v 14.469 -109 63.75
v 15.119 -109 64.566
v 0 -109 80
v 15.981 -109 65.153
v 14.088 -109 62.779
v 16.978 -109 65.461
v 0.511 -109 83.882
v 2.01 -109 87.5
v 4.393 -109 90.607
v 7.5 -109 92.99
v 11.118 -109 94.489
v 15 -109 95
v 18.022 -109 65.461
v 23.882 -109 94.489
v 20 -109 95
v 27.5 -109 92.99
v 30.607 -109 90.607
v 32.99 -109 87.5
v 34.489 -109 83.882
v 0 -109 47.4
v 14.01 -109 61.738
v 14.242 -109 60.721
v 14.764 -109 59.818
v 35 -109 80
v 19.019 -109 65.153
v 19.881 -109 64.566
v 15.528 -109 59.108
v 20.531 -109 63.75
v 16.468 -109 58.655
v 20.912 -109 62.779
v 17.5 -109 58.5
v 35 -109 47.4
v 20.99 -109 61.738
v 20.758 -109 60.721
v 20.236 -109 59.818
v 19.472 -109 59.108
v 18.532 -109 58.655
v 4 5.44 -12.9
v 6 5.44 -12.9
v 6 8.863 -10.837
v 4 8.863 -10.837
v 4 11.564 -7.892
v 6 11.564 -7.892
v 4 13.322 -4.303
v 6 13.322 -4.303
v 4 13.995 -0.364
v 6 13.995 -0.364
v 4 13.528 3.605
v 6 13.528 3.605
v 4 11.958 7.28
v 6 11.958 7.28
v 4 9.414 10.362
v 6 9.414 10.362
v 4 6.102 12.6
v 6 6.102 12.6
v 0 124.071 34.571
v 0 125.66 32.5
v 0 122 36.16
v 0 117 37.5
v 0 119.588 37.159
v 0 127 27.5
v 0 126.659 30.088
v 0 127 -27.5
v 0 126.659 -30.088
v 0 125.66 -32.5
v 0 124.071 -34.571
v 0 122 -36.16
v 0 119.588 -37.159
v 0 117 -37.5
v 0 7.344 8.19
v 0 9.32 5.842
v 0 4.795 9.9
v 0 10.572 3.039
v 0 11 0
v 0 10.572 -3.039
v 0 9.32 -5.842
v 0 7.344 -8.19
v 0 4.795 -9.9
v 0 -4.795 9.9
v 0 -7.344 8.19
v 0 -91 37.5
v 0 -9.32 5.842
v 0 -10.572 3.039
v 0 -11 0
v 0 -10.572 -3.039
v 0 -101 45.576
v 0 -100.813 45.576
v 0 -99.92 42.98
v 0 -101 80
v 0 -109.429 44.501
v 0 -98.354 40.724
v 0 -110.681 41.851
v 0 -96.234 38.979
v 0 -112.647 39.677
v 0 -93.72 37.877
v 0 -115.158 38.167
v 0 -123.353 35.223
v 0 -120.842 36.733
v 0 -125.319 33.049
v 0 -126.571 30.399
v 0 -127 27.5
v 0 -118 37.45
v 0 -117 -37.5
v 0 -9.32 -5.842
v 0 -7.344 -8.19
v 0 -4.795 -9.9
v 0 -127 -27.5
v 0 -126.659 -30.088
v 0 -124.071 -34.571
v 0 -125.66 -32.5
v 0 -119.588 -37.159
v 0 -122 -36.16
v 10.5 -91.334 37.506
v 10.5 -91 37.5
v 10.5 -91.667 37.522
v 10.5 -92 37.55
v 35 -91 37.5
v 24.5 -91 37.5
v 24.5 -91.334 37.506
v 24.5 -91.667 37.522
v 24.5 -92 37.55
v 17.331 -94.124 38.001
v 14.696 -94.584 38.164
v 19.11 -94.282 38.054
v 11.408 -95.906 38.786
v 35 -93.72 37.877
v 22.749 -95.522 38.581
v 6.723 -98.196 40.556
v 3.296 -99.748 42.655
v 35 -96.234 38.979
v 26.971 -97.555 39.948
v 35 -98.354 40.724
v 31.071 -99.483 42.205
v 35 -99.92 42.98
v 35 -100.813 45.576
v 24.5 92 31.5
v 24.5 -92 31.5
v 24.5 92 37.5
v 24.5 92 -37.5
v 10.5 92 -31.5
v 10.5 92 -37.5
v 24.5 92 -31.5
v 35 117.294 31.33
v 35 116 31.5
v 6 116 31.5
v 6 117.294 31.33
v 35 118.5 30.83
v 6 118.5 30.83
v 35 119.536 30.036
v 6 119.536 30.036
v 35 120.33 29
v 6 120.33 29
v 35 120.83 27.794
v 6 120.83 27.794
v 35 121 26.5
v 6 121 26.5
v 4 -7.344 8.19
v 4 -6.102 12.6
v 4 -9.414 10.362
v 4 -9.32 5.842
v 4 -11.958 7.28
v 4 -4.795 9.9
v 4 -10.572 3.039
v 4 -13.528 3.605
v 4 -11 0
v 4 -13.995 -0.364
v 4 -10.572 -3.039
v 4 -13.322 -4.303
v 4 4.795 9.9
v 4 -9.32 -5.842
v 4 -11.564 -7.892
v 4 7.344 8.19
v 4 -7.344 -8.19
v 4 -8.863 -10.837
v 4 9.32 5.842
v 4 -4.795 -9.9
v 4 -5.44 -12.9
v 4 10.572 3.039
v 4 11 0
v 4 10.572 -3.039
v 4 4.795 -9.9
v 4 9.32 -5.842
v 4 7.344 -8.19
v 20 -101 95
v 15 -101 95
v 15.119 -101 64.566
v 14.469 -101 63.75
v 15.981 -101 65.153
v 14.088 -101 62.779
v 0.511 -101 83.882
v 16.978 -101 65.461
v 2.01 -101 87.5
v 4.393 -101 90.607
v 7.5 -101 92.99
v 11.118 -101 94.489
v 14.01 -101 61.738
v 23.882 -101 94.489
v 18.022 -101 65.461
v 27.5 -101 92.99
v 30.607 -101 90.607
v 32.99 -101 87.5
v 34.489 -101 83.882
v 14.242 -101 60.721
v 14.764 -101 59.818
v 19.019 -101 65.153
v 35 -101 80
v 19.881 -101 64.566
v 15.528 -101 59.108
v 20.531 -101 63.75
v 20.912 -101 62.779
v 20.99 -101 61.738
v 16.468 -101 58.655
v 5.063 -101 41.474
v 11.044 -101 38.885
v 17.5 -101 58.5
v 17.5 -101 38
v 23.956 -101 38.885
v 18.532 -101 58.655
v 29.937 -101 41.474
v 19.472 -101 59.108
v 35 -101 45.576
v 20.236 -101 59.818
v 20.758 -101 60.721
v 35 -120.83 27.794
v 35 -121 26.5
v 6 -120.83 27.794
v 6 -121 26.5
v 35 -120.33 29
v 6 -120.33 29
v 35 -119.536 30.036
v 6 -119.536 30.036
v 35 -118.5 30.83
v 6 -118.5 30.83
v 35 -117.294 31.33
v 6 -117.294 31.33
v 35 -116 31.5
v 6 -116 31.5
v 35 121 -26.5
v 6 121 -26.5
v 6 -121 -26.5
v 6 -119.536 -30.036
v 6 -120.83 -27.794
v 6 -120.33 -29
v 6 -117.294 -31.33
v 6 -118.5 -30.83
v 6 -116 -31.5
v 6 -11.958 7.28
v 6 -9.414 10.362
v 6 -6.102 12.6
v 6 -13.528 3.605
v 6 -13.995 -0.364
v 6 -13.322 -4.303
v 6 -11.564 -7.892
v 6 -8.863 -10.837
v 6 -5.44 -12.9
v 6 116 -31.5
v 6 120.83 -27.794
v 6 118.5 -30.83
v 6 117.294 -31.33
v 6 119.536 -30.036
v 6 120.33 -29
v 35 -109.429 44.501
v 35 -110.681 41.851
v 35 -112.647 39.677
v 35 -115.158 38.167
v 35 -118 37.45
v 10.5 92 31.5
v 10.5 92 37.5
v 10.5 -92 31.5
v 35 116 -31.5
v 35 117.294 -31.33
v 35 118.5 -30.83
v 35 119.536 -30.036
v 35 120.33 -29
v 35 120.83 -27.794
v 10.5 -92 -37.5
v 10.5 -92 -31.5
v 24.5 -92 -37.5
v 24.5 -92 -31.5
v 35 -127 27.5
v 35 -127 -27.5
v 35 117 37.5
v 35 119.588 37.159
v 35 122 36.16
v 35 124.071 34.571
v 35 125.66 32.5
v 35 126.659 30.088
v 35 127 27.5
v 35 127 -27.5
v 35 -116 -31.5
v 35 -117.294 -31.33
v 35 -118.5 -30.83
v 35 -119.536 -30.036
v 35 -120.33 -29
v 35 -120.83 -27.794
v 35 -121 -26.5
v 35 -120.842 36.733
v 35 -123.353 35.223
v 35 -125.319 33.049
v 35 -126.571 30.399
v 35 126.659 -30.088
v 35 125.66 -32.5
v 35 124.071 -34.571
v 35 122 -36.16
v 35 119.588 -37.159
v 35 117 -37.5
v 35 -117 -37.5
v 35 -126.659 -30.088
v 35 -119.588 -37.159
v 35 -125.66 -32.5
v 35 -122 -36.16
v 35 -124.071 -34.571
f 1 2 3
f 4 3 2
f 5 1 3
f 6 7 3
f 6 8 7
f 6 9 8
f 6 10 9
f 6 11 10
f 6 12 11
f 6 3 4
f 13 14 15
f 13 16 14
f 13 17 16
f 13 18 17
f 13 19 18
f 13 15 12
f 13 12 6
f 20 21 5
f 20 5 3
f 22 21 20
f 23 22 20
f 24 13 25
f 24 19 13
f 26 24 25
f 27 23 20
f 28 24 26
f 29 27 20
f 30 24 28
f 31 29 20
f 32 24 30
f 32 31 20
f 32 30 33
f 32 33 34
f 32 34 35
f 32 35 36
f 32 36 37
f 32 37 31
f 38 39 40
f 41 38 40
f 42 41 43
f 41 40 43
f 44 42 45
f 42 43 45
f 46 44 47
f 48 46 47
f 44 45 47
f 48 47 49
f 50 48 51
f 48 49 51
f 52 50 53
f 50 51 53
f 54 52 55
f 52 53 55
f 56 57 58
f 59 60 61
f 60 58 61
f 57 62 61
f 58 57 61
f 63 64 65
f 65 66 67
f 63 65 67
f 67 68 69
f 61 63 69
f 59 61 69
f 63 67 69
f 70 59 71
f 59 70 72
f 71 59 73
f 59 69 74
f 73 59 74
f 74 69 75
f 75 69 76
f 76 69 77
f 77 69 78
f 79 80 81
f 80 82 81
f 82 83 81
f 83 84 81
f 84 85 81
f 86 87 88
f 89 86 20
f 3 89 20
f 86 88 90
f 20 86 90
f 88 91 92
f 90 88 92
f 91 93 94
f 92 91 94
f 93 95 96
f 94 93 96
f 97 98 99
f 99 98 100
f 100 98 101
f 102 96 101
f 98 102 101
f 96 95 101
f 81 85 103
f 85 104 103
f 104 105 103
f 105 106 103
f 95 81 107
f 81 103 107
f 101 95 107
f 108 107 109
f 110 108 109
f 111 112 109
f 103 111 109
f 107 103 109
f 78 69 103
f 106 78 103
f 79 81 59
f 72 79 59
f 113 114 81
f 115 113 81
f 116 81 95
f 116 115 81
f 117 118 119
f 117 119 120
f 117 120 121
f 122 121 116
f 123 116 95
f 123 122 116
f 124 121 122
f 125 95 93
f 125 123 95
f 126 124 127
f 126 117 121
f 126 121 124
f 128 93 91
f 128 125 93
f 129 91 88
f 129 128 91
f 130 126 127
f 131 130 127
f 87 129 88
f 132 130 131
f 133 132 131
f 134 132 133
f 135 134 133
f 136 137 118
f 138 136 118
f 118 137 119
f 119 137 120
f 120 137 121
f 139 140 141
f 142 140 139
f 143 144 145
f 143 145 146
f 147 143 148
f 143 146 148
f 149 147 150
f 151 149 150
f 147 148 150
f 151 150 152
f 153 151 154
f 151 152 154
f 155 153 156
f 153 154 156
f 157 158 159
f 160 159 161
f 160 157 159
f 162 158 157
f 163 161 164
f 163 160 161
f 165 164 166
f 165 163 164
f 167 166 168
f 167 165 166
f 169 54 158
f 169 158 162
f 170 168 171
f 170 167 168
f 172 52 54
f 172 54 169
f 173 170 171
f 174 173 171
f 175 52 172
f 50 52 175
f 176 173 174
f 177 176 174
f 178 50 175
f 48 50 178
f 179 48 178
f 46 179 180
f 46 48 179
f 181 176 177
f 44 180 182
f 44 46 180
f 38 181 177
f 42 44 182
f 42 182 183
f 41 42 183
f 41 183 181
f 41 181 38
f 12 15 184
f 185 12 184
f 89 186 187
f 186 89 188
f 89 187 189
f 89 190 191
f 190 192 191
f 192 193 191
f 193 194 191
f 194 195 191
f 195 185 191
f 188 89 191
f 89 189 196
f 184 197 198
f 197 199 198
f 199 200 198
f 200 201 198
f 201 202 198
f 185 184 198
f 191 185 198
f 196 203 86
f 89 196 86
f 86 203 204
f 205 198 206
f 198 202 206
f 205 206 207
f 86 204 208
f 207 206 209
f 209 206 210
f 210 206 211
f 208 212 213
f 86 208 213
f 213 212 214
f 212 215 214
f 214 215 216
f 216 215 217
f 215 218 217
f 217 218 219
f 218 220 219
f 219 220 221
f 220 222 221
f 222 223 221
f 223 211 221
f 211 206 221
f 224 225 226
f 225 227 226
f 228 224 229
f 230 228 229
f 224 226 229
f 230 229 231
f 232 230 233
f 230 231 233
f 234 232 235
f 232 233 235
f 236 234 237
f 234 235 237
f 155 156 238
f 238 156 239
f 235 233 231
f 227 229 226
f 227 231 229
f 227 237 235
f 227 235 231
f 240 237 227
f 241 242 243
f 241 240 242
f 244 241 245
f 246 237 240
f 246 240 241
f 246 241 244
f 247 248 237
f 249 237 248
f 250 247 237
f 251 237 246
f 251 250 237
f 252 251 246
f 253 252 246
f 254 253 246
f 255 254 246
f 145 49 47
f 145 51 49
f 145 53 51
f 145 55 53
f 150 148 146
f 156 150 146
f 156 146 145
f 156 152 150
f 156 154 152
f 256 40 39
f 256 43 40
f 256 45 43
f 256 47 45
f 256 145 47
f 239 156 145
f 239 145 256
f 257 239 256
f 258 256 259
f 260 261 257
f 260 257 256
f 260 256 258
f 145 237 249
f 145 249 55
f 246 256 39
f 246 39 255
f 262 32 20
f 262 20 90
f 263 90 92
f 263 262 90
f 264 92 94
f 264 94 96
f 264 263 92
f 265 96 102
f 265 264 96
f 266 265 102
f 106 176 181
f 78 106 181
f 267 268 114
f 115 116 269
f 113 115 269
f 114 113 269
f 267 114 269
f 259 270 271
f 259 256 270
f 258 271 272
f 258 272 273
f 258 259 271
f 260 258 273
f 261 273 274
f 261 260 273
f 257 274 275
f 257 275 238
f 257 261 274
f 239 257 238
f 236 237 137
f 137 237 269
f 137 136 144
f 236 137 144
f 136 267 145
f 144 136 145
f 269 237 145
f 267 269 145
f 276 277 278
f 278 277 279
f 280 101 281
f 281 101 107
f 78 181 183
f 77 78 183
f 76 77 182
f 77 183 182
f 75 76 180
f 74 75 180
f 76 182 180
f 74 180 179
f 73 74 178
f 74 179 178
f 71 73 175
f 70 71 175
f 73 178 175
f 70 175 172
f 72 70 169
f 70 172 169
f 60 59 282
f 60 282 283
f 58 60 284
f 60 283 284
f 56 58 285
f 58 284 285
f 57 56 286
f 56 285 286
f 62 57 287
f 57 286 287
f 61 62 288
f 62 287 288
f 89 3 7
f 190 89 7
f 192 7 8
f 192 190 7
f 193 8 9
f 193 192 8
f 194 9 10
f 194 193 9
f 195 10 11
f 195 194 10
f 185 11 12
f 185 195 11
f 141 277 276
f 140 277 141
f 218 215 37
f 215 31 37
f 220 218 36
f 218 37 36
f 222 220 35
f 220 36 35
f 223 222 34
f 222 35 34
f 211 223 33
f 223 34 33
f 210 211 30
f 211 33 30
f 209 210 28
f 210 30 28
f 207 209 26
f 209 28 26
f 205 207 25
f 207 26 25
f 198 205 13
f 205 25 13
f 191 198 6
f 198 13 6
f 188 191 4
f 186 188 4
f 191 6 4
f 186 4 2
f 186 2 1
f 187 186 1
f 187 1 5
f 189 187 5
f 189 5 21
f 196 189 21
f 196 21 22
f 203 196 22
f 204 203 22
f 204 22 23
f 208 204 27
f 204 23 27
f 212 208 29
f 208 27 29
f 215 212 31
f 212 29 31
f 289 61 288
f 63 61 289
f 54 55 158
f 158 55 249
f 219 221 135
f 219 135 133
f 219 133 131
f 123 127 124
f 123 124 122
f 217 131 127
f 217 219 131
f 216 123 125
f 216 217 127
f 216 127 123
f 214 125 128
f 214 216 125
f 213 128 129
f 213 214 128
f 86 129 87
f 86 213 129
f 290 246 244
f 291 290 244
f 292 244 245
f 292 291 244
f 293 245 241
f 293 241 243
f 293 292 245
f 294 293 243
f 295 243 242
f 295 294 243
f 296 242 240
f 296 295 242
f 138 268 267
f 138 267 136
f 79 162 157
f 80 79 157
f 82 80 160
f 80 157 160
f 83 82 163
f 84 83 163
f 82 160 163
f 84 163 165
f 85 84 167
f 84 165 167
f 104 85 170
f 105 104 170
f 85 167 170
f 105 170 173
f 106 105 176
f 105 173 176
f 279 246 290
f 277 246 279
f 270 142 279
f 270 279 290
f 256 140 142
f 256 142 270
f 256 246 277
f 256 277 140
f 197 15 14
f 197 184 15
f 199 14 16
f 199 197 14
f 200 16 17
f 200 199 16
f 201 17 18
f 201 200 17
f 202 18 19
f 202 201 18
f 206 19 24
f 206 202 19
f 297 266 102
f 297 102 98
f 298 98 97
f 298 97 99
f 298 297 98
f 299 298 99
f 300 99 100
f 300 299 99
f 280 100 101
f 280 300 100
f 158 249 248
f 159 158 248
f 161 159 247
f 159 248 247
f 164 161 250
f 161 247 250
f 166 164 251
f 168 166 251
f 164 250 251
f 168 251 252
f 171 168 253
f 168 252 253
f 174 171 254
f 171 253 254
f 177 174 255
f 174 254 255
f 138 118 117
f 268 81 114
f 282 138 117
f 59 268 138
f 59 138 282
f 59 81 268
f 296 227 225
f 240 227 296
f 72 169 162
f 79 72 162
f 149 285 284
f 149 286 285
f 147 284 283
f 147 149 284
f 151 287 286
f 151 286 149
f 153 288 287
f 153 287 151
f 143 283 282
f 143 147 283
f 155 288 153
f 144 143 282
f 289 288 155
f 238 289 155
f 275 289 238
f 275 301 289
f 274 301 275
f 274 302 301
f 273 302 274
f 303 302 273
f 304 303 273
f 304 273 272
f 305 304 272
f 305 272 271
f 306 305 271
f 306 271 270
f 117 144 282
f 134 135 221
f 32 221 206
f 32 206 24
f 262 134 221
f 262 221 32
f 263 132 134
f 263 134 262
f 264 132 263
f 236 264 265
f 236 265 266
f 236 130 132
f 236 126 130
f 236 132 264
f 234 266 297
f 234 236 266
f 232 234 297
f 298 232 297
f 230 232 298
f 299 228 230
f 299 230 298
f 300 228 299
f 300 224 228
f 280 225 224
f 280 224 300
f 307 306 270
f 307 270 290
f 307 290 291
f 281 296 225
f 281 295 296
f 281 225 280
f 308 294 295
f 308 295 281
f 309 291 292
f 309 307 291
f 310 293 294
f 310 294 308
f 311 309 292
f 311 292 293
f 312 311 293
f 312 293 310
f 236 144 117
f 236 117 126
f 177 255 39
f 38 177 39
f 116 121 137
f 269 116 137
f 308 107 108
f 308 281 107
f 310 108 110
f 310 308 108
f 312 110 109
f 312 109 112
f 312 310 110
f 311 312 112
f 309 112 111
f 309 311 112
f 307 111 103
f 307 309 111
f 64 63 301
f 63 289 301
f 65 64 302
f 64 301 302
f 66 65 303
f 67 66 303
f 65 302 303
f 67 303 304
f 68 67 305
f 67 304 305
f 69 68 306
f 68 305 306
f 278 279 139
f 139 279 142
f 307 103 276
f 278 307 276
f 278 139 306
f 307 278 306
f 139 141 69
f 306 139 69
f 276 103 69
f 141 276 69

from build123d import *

# Parameters (mm, degrees)
SKETCH3_W                 = 75
SKETCH3_H                 = 254
BOSS_EXTRUDE2_DEPTH       = 35
SHELL2_T                  = -6
CUT_EXTRUDE1_DEPTH        = 2
CUT_EXTRUDE2_DEPTH        = 137.000919115
SKETCH6_W                 = 14
SKETCH6_H                 = 184
CUT_EXTRUDE3_DEPTH        = 152.58825812
FILLET1_R                 = 10
FILLET2_R                 = 5
SKETCH12_W                = 57.5
SKETCH12_H                = 8
BOSS_EXTRUDE4_DEPTH       = 35
FILLET5_R                 = 10
FILLET6_R                 = 15
M8X1_0_TAPPED_HOLE1_D     = 7
M8X1_0_TAPPED_HOLE1_DEPTH = 8
M8X1_0_TAPPED_HOLE1_TIP   = 2.103012167
SKETCH16_R                = 24
CUT_EXTRUDE4_DEPTH        = 91


with BuildPart() as part:
    # Sketch3 → Boss-Extrude2 (new body)
    with BuildSketch(Plane(origin=(0, 0, 0), x_dir=(0, 0, -1), z_dir=(1, 0, 0))):
        Rectangle(SKETCH3_W, SKETCH3_H)
    extrude(amount=BOSS_EXTRUDE2_DEPTH)

    # Shell2
    shell2_openings = [part.faces().sort_by_distance(p)[0] for p in [
        (35, 0, 0),
    ]]
    offset(amount=SHELL2_T, openings=shell2_openings, kind=Kind.INTERSECTION)

    # Sketch4 → Cut-Extrude1 (cut)
    with BuildSketch(Plane(origin=(6, 0, 0), x_dir=(0, 0, -1), z_dir=(1, 0, 0))):
        with BuildLine():
            Line((12.9, -5.439669108), (12.9, 5.439669108))
            ThreePointArc((12.9, 5.439669108), (0.363761531, 13.9952734), (-12.6, 6.102458521))
            Line((-12.6, 6.102458521), (-12.6, -6.102458521))
            ThreePointArc((-12.6, -6.102458521), (0.363761531, -13.9952734), (12.9, -5.439669108))
        make_face()
    extrude(amount=-CUT_EXTRUDE1_DEPTH, mode=Mode.SUBTRACT)

    # Sketch5 → Cut-Extrude2 (cut, through all)
    with BuildSketch(Plane(origin=(4, 0, 0), x_dir=(0, 0, -1), z_dir=(1, 0, 0))):
        with BuildLine():
            Line((9.9, -4.794788838), (9.9, 4.794788838))
            ThreePointArc((9.9, 4.794788838), (0, 11), (-9.9, 4.794788838))
            Line((-9.9, 4.794788838), (-9.9, -4.794788838))
            ThreePointArc((-9.9, -4.794788838), (0, -11), (9.9, -4.794788838))
        make_face()
    extrude(amount=-CUT_EXTRUDE2_DEPTH, mode=Mode.SUBTRACT)

    # Sketch6 → Cut-Extrude3 (cut, through all)
    with BuildSketch(Plane.XY.offset(37.5)):
        with Locations((17.5, 0)):
            Rectangle(SKETCH6_W, SKETCH6_H)
    extrude(amount=-CUT_EXTRUDE3_DEPTH, mode=Mode.SUBTRACT)

    # Fillet1
    fillet1_edges = [part.edges().sort_by_distance(p)[0] for p in [
        (17.5, -127, -37.5),
        (17.5, -127, 37.5),
        (17.5, 127, 37.5),
        (17.5, 127, -37.5),
    ]]
    fillet(fillet1_edges, radius=FILLET1_R)

    # Fillet2
    fillet2_edges = [part.edges().sort_by_distance(p)[0] for p in [
        (20.5, -121, -31.5),
        (20.5, 121, -31.5),
        (20.5, 121, 31.5),
        (20.5, -121, 31.5),
    ]]
    fillet(fillet2_edges, radius=FILLET2_R)

    # Sketch12 → Boss-Extrude4 (add)
    with BuildSketch(Plane(origin=(35, 0, 0), x_dir=(0, 0, -1), z_dir=(1, 0, 0))):
        with Locations((-66.25, -105)):
            Rectangle(SKETCH12_W, SKETCH12_H)
    extrude(amount=-BOSS_EXTRUDE4_DEPTH)

    # Fillet5
    # the kernel refuses this fillet: 10 mm, written as the material it adds along each edge
    with BuildSketch(Plane(origin=(35, -109, 37.5), x_dir=(0, -0.9999844906159053, -0.0055694279462415305), z_dir=(-1, 0, 0))) as fillet5_piece_1:
        with BuildLine():
            CenterArc((9.944708969, 9.955289483), FILLET5_R, 180.319106365, 84.260829523)
            Line((-0.055135937, 9.899595203), (-1.055120428, 9.894025775))
            Line((-1.055120428, 9.894025775), (-0.999984491, -0.005569428))
            Line((-0.999984491, -0.005569428), (0.005569428, -0.999984491))
            ThreePointArc((0.005569428, -0.999984491), (8.005445353, -0.955429067), (8.905682648, -0.995528948))
            Line((8.905682648, -0.995528948), (9.000139587, 0))
        make_face()
    extrude(amount=35)
    with BuildSketch(Plane(origin=(35, -101, 37.5), x_dir=(0, 1, 0), z_dir=(-1, 0, 0))) as fillet5_piece_2_section:
        with BuildLine():
            CenterArc((FILLET5_R, -FILLET5_R), FILLET5_R, 90, 90)
            Line((0, -FILLET5_R), (0, 0))
            Line((0, 0), (FILLET5_R, 0))
        make_face()
    fillet5_piece_2 = extrude(amount=35, mode=Mode.PRIVATE)
    fillet5_piece_2 = split(fillet5_piece_2, bisect_by=Plane(origin=(29.75, -92, 37.408860849), z_dir=(0, 1, 0)), keep=Keep.TOP, mode=Mode.PRIVATE)
    fillet5_piece_2 = split(fillet5_piece_2, bisect_by=Plane(origin=(24.5, -91.519267155, 37.408860849), z_dir=(1, 0, 0)), keep=Keep.TOP, mode=Mode.PRIVATE)
    add(fillet5_piece_2)
    with BuildSketch(Plane(origin=(35, -101, 37.5), x_dir=(0, 1, 0), z_dir=(-1, 0, 0))) as fillet5_piece_3_section:
        with BuildLine():
            CenterArc((FILLET5_R, -FILLET5_R), FILLET5_R, 90, 90)
            Line((0, -FILLET5_R), (0, 0))
            Line((0, 0), (FILLET5_R, 0))
        make_face()
    fillet5_piece_3 = extrude(amount=35, mode=Mode.PRIVATE)
    fillet5_piece_3 = split(fillet5_piece_3, bisect_by=Plane(origin=(29.75, -92, 39.784135406), z_dir=(0, -1, 0)), keep=Keep.TOP, mode=Mode.PRIVATE)
    fillet5_piece_3 = split(fillet5_piece_3, bisect_by=Plane(origin=(24.5, -98.797900168, 39.784135406), z_dir=(1, 0, 0)), keep=Keep.TOP, mode=Mode.PRIVATE)
    add(fillet5_piece_3)
    with BuildSketch(Plane(origin=(35, -101, 37.5), x_dir=(0, 1, 0), z_dir=(-1, 0, 0))) as fillet5_piece_4_section:
        with BuildLine():
            CenterArc((FILLET5_R, -FILLET5_R), FILLET5_R, 90, 90)
            Line((0, -FILLET5_R), (0, 0))
            Line((0, 0), (FILLET5_R, 0))
        make_face()
    fillet5_piece_4 = extrude(amount=35, mode=Mode.PRIVATE)
    fillet5_piece_4 = split(fillet5_piece_4, bisect_by=Plane(origin=(10.5, -98.797900168, 39.784135406), z_dir=(1, 0, 0)), keep=Keep.TOP, mode=Mode.PRIVATE)
    fillet5_piece_4 = split(fillet5_piece_4, bisect_by=Plane(origin=(17.5, -92, 39.784135406), z_dir=(0, -1, 0)), keep=Keep.TOP, mode=Mode.PRIVATE)
    fillet5_piece_4 = split(fillet5_piece_4, bisect_by=Plane(origin=(24.5, -98.797900168, 39.784135406), z_dir=(-1, 0, 0)), keep=Keep.TOP, mode=Mode.PRIVATE)
    add(fillet5_piece_4)
    with BuildSketch(Plane(origin=(35, -101, 37.5), x_dir=(0, 1, 0), z_dir=(-1, 0, 0))) as fillet5_piece_5_section:
        with BuildLine():
            CenterArc((FILLET5_R, -FILLET5_R), FILLET5_R, 90, 90)
            Line((0, -FILLET5_R), (0, 0))
            Line((0, 0), (FILLET5_R, 0))
        make_face()
    fillet5_piece_5 = extrude(amount=35, mode=Mode.PRIVATE)
    fillet5_piece_5 = split(fillet5_piece_5, bisect_by=Plane(origin=(10.5, -91.519267155, 37.408860849), z_dir=(-1, 0, 0)), keep=Keep.TOP, mode=Mode.PRIVATE)
    fillet5_piece_5 = split(fillet5_piece_5, bisect_by=Plane(origin=(5.25, -92, 37.408860849), z_dir=(0, 1, 0)), keep=Keep.TOP, mode=Mode.PRIVATE)
    add(fillet5_piece_5)
    with BuildSketch(Plane(origin=(35, -101, 37.5), x_dir=(0, 1, 0), z_dir=(-1, 0, 0))) as fillet5_piece_6_section:
        with BuildLine():
            CenterArc((FILLET5_R, -FILLET5_R), FILLET5_R, 90, 90)
            Line((0, -FILLET5_R), (0, 0))
            Line((0, 0), (FILLET5_R, 0))
        make_face()
    fillet5_piece_6 = extrude(amount=35, mode=Mode.PRIVATE)
    fillet5_piece_6 = split(fillet5_piece_6, bisect_by=Plane(origin=(10.5, -98.797900168, 39.784135406), z_dir=(-1, 0, 0)), keep=Keep.TOP, mode=Mode.PRIVATE)
    fillet5_piece_6 = split(fillet5_piece_6, bisect_by=Plane(origin=(5.25, -92, 39.784135406), z_dir=(0, -1, 0)), keep=Keep.TOP, mode=Mode.PRIVATE)
    add(fillet5_piece_6)

    # Fillet6
    fillet6_edges = [part.edges().sort_by_distance(p)[0] for p in [
        (35, -105, 95),
        (0, -105, 95),
    ]]
    fillet(fillet6_edges, radius=FILLET6_R)

    # M8x1.0 Tapped Hole1
    with Locations(Plane(origin=(17.5, -101, 62), x_dir=(0, 0, 1), z_dir=(0, 1, 0))):
        with Locations((0, 0)):
            Hole(M8X1_0_TAPPED_HOLE1_D / 2, depth=M8X1_0_TAPPED_HOLE1_DEPTH)
            with Locations((0, 0, -(M8X1_0_TAPPED_HOLE1_DEPTH + M8X1_0_TAPPED_HOLE1_TIP / 2))):  # 118° drill point
                Cone(0, M8X1_0_TAPPED_HOLE1_D / 2, M8X1_0_TAPPED_HOLE1_TIP, mode=Mode.SUBTRACT)

    # Sketch16 → Cut-Extrude4 (cut)
    with BuildSketch(Plane(origin=(0, -101, 0), x_dir=(1, 0, 0), z_dir=(0, 1, 0))):
        with Locations((17.5, -62)):
            Circle(SKETCH16_R)
    extrude(amount=CUT_EXTRUDE4_DEPTH, mode=Mode.SUBTRACT)


solid = part.part
